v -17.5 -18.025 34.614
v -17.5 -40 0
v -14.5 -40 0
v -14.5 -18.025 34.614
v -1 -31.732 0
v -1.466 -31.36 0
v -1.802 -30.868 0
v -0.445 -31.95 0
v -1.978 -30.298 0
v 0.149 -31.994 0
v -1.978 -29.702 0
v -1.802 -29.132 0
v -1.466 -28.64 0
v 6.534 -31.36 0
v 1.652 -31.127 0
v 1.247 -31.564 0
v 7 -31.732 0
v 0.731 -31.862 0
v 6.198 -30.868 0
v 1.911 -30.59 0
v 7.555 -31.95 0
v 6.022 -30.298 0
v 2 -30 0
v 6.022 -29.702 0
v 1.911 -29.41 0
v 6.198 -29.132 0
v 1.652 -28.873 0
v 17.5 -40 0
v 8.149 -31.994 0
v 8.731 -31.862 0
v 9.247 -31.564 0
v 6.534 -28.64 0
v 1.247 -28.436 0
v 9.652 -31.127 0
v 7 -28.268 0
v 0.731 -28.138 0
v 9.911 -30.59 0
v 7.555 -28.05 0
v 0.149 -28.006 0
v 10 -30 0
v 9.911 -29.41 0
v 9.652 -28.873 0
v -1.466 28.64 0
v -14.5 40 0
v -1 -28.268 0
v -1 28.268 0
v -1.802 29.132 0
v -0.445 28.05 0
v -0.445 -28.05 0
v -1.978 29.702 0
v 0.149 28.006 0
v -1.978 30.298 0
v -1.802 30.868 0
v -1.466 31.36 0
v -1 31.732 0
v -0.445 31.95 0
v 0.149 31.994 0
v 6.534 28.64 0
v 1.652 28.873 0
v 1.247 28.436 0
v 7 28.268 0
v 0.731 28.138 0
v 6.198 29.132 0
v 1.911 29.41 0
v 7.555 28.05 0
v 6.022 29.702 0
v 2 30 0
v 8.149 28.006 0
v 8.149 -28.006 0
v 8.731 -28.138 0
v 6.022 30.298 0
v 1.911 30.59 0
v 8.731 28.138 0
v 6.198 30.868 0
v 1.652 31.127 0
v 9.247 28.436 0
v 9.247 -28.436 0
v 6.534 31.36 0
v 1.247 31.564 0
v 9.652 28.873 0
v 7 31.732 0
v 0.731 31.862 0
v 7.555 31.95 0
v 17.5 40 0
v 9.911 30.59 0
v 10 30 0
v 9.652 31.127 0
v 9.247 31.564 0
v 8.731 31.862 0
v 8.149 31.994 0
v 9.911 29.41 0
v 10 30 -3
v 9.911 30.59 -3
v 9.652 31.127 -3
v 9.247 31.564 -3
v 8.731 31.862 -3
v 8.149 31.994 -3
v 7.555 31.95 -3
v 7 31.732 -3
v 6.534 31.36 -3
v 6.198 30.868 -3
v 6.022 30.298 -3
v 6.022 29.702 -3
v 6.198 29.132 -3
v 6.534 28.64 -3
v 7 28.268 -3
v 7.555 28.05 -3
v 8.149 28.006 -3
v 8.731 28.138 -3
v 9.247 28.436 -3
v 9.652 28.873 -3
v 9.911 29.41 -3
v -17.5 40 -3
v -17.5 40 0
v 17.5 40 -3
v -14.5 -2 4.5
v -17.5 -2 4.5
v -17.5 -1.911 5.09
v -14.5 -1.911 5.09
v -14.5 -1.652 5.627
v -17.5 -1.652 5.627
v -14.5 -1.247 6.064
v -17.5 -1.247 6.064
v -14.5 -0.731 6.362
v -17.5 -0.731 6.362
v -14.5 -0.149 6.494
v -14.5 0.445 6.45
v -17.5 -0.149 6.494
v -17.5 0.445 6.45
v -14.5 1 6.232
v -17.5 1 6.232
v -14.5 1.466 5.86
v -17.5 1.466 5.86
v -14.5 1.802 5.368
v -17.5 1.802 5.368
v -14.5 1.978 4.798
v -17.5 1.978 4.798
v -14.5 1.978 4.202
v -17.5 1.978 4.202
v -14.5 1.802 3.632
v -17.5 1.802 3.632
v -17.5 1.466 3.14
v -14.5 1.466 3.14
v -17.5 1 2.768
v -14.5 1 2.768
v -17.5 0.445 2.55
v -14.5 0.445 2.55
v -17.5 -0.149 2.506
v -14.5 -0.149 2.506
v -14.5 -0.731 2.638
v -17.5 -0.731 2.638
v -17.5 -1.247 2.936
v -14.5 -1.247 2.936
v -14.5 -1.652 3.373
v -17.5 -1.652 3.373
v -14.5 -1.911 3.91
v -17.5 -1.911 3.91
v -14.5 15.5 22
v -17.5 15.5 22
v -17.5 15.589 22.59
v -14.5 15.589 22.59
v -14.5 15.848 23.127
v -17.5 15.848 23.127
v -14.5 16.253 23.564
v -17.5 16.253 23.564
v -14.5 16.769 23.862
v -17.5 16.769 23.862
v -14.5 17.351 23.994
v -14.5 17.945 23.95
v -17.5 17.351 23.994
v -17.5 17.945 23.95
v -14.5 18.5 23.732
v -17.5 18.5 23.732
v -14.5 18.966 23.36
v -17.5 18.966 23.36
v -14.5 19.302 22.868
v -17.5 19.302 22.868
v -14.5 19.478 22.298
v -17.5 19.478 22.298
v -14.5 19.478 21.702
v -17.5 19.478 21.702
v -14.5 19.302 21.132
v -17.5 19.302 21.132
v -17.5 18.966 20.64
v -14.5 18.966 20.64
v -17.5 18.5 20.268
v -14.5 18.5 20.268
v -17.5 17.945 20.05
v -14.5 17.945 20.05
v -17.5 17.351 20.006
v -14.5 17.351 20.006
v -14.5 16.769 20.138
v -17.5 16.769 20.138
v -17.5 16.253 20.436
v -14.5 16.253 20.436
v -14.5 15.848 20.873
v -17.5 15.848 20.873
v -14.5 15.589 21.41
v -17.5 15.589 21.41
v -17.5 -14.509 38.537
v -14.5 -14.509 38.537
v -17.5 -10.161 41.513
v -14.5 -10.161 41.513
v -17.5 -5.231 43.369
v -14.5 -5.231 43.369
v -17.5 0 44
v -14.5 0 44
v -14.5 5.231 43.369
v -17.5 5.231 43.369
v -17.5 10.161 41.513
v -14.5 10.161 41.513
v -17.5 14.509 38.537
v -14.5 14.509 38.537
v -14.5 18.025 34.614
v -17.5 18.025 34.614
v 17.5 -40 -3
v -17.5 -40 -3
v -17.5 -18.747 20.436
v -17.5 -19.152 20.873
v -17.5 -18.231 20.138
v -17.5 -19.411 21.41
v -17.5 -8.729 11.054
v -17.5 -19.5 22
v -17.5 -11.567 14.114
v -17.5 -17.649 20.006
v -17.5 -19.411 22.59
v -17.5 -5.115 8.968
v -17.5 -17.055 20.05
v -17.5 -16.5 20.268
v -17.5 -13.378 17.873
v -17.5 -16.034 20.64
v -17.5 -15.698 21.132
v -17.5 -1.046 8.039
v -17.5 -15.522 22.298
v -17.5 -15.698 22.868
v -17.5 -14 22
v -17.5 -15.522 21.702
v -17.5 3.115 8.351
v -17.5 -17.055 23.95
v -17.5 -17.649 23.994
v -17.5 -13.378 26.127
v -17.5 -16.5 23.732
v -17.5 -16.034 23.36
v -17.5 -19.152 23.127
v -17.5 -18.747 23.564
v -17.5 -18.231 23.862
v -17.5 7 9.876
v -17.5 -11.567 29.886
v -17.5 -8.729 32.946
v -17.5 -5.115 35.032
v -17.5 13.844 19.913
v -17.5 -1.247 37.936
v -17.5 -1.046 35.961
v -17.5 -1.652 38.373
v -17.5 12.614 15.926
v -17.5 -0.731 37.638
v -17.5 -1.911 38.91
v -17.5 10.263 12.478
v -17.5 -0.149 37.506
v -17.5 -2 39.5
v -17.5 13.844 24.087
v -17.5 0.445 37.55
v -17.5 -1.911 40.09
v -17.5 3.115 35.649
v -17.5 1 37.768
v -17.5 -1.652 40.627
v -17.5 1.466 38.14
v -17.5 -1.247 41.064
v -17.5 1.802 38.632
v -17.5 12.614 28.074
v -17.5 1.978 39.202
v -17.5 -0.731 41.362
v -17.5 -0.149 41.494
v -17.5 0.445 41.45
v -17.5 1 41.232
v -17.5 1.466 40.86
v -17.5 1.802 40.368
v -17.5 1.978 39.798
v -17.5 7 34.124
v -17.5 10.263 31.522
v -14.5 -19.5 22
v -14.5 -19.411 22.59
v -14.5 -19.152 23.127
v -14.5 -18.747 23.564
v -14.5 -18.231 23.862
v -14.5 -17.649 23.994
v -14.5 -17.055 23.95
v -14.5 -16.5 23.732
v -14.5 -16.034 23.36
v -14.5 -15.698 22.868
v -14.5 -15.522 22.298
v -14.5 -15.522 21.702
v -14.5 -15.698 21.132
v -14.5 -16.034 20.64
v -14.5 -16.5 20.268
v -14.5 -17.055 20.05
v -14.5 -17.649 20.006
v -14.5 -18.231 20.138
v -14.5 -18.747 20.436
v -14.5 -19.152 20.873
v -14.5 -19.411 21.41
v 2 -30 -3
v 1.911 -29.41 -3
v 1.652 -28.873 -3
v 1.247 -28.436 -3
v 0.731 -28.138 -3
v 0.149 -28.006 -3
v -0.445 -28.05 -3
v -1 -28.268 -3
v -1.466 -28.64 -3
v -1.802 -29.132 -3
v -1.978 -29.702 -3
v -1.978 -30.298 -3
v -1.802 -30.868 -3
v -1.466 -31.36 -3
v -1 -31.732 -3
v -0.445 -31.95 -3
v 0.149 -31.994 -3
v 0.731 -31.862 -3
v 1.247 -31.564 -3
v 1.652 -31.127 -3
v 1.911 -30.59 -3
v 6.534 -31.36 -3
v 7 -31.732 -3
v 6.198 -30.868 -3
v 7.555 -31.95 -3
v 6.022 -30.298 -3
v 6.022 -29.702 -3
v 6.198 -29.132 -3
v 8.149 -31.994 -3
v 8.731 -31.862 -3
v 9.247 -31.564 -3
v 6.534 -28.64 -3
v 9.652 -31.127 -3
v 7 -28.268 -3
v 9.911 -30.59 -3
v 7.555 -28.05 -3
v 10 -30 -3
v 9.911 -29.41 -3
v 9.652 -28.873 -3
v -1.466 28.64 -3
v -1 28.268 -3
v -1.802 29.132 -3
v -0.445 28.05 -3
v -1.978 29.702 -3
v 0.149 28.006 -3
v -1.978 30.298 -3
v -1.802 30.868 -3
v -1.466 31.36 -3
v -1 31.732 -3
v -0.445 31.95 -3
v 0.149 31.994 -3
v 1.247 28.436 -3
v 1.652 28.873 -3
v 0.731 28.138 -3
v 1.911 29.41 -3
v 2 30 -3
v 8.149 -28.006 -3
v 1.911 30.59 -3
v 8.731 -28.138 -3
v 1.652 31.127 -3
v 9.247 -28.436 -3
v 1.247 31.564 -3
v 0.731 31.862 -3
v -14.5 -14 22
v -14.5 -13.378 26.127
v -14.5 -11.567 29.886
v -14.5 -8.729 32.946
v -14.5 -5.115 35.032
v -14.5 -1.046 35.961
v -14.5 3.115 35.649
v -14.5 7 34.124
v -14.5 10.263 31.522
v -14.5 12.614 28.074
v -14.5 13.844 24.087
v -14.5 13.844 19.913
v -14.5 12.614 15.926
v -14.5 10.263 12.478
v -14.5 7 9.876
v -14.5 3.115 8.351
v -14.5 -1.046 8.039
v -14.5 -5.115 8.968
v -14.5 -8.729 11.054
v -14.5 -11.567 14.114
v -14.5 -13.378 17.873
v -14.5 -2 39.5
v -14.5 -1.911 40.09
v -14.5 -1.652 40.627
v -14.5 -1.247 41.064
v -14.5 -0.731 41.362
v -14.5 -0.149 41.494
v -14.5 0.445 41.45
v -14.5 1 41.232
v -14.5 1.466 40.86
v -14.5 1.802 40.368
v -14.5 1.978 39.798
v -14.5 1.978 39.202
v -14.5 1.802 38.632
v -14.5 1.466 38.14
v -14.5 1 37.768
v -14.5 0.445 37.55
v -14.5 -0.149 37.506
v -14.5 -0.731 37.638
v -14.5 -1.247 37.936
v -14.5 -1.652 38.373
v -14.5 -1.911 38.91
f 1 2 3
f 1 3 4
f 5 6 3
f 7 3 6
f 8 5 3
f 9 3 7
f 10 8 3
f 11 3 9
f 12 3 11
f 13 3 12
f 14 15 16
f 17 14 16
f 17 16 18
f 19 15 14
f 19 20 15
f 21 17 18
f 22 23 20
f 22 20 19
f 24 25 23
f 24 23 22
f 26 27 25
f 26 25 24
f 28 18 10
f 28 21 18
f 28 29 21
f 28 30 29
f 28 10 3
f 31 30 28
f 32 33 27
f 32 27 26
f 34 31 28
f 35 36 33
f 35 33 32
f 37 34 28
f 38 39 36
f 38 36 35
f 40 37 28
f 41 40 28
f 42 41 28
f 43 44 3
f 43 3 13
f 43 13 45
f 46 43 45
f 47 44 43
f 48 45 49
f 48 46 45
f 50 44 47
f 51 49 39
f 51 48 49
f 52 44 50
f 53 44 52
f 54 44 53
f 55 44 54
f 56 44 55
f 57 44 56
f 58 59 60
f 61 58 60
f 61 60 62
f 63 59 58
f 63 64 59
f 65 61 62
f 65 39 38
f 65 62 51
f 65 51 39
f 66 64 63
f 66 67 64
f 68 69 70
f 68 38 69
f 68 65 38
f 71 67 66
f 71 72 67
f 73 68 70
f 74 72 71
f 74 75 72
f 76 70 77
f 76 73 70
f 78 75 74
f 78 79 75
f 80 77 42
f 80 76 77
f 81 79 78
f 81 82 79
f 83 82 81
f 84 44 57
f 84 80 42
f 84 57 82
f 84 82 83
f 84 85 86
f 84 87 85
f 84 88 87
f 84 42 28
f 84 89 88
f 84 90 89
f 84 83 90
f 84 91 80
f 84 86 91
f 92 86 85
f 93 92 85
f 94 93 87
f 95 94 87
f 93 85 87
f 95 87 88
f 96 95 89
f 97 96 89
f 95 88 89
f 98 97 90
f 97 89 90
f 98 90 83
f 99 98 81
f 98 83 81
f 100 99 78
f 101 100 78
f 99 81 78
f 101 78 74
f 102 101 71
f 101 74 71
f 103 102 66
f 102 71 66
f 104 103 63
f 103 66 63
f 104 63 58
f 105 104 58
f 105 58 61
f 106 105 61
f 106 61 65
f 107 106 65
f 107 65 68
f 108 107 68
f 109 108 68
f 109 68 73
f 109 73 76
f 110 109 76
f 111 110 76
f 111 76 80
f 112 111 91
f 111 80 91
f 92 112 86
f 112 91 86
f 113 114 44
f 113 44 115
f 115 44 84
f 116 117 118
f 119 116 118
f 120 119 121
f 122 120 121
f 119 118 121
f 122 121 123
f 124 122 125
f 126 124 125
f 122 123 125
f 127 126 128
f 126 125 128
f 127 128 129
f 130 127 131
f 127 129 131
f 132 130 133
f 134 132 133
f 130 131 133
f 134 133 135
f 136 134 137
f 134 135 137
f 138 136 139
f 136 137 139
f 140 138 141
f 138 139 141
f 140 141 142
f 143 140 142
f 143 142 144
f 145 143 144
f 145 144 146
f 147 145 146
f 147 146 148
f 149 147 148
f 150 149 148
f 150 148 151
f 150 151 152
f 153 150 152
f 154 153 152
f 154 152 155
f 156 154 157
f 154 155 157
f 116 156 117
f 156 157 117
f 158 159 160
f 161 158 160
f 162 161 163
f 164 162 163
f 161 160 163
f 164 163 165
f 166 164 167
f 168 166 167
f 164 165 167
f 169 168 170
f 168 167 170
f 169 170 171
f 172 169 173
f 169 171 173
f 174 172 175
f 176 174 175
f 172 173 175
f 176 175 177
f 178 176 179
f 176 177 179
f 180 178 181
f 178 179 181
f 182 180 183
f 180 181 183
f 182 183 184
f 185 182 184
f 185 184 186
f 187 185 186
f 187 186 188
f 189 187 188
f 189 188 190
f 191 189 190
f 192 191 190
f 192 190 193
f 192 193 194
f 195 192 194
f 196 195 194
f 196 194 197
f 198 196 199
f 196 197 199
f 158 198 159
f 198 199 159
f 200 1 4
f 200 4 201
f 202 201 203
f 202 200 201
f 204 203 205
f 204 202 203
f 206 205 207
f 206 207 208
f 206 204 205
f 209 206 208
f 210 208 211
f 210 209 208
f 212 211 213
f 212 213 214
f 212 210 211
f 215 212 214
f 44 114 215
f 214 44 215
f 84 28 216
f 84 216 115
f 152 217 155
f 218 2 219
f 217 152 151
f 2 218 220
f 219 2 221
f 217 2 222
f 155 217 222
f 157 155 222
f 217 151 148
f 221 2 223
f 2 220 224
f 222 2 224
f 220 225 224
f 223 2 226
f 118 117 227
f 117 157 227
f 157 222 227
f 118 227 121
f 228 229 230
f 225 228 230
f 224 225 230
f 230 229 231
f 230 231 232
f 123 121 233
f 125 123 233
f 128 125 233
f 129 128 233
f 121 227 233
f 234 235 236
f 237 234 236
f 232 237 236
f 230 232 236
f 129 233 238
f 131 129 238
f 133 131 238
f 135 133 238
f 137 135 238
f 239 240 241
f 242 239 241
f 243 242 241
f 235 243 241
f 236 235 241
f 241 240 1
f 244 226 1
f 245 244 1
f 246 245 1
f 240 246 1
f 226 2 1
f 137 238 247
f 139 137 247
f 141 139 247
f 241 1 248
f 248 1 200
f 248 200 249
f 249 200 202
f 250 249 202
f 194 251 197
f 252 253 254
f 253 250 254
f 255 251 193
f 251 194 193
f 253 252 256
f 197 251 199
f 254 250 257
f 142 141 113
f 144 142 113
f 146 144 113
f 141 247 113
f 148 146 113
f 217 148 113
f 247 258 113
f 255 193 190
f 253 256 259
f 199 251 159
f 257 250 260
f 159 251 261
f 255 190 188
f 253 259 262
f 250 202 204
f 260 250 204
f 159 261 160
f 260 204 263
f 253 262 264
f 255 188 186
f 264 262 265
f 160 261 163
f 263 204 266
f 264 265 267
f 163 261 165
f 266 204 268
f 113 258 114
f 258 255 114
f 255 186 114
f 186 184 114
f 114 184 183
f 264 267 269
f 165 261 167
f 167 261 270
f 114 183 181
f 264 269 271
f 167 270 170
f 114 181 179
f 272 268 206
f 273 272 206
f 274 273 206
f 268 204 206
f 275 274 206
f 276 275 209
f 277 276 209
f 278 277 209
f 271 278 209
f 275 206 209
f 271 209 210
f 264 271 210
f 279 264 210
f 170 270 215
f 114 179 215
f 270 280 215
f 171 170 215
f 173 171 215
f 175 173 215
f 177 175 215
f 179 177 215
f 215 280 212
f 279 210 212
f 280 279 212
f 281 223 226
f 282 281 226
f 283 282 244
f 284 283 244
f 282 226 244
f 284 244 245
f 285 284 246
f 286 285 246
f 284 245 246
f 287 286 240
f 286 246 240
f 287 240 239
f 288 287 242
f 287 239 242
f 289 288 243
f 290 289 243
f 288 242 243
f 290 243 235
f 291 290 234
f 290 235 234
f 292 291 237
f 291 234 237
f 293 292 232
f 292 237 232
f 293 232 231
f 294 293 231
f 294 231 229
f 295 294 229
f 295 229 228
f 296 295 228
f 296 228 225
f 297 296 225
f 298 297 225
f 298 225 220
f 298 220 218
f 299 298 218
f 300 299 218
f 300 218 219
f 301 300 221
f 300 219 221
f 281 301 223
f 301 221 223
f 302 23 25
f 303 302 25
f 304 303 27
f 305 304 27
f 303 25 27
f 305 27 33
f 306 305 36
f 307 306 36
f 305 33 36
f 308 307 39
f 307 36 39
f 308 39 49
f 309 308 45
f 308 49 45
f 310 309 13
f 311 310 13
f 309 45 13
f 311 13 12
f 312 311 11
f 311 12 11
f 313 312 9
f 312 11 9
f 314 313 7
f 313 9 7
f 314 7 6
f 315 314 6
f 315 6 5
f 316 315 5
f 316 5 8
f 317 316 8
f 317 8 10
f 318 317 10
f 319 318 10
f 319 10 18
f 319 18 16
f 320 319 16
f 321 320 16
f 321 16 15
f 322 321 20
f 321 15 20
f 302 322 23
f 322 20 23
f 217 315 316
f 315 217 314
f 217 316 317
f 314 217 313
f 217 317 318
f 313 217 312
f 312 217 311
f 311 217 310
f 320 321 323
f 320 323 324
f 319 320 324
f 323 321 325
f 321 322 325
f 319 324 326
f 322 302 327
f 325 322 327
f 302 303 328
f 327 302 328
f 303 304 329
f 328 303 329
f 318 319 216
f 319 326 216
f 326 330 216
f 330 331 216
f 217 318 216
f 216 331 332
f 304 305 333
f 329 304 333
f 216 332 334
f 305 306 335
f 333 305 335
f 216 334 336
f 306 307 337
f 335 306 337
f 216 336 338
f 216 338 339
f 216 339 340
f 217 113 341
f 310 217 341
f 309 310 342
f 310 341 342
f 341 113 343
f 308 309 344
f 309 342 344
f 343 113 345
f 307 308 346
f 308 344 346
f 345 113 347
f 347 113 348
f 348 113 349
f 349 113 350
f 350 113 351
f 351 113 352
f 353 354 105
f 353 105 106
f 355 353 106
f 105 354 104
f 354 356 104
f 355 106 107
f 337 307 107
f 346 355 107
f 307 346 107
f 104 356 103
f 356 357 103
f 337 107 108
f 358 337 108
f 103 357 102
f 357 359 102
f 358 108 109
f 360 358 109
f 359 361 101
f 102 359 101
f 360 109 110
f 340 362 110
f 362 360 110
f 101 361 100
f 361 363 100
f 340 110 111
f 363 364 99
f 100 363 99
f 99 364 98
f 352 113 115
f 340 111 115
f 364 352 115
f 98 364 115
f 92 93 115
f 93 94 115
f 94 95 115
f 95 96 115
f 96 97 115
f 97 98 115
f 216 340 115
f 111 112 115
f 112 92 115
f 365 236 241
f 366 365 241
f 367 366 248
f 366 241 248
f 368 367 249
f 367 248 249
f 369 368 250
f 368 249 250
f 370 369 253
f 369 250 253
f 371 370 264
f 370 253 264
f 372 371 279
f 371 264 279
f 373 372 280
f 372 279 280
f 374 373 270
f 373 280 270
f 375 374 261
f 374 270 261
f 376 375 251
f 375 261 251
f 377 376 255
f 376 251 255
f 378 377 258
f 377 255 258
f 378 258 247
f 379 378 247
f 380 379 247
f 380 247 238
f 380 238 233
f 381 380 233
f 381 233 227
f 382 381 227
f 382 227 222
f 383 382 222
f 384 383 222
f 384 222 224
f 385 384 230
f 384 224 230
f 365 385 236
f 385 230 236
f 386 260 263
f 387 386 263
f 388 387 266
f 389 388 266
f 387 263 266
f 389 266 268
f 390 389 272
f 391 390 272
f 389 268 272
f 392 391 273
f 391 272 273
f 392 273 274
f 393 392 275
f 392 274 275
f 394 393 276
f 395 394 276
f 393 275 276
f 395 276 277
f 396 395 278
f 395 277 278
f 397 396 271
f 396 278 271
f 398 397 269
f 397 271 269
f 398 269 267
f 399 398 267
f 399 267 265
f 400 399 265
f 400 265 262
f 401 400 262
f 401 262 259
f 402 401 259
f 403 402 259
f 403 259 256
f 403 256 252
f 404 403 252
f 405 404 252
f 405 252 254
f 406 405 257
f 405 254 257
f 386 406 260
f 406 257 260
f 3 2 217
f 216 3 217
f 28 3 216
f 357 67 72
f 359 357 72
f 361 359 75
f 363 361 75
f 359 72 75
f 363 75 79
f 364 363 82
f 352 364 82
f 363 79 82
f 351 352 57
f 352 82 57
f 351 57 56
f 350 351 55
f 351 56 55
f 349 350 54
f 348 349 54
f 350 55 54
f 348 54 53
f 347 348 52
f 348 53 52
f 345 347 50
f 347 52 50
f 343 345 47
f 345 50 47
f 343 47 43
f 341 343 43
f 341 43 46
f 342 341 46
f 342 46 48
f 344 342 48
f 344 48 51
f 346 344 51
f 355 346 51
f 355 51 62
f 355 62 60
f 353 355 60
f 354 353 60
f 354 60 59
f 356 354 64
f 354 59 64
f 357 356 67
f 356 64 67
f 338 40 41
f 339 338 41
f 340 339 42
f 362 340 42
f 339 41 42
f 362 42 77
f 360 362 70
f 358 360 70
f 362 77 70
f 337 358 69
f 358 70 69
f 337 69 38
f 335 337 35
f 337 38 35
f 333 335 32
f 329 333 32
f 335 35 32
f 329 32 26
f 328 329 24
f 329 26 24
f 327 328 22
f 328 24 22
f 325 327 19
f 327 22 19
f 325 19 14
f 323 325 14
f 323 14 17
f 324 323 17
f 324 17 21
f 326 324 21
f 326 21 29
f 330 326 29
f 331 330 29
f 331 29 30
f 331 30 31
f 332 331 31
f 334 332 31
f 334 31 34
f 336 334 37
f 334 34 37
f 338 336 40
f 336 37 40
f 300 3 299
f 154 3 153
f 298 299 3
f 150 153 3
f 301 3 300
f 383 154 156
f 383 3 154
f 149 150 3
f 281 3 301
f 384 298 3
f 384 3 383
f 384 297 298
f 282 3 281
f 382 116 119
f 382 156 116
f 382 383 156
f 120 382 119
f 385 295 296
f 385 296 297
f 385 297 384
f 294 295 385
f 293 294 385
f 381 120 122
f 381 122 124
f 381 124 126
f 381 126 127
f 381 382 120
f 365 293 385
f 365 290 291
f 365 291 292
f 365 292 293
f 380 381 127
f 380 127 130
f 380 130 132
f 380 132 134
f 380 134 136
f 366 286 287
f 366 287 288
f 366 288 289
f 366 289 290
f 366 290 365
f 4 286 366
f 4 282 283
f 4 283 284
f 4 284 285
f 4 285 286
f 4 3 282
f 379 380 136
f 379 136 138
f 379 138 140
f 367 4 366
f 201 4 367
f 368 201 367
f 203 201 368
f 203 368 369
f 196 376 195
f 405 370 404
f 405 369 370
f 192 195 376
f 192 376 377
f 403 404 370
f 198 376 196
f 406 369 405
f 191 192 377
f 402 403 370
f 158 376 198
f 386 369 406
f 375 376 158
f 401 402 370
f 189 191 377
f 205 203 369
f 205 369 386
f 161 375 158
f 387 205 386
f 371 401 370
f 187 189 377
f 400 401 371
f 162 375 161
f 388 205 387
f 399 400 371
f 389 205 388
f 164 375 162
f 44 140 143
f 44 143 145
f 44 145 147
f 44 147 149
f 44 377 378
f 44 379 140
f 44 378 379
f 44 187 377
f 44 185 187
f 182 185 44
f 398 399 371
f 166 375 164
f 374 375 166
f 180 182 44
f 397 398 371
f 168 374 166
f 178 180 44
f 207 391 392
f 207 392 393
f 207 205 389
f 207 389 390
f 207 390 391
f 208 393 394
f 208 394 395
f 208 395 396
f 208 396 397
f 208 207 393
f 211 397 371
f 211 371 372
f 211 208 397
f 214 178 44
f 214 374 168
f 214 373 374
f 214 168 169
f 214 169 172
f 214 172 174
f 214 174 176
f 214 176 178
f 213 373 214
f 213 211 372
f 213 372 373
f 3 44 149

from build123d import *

# Parameters (mm, degrees)
SKETCH_W      = 35
SKETCH_H      = 80
SKETCH_R      = 2
PAD_DEPTH     = 3
SKETCH001_R   = 14
SKETCH001_R_2 = 2
PAD001_DEPTH  = 3


with BuildPart() as part:
    # Sketch → Pad (new body)
    with BuildSketch(Plane.XY):
        Rectangle(SKETCH_W, SKETCH_H)
        with Locations((0, 30)):
            Circle(SKETCH_R, mode=Mode.SUBTRACT)
        with Locations((0, -30)):
            Circle(SKETCH_R, mode=Mode.SUBTRACT)
        with Locations((8, 30)):
            Circle(SKETCH_R, mode=Mode.SUBTRACT)
        with Locations((8, -30)):
            Circle(SKETCH_R, mode=Mode.SUBTRACT)
    extrude(amount=-PAD_DEPTH)

    # Sketch001 (on Face4 of Pad) → Pad001 (join)
    with BuildSketch(Plane(origin=(-17.5, 0, 0), x_dir=(0, -1, 0), z_dir=(-1, 0, 0))):
        with BuildLine():
            Line((40, 0), (-40, 0))
            Line((-40, 0), (-18.024946, 34.613538))
            ThreePointArc((18.024946, 34.613538), (0, 44), (-18.024946, 34.613538))
            Line((40, 0), (18.024946, 34.613538))
        make_face()
        with Locations((0, 22)):
            Circle(SKETCH001_R, mode=Mode.SUBTRACT)
        with Locations((0, 4.5)):
            Circle(SKETCH001_R_2, mode=Mode.SUBTRACT)
        with Locations((0, 39.5)):
            Circle(SKETCH001_R_2, mode=Mode.SUBTRACT)
        with Locations((-17.5, 22)):
            Circle(SKETCH001_R_2, mode=Mode.SUBTRACT)
        with Locations((17.5, 22)):
            Circle(SKETCH001_R_2, mode=Mode.SUBTRACT)
    extrude(amount=-PAD001_DEPTH)


solid = part.part
